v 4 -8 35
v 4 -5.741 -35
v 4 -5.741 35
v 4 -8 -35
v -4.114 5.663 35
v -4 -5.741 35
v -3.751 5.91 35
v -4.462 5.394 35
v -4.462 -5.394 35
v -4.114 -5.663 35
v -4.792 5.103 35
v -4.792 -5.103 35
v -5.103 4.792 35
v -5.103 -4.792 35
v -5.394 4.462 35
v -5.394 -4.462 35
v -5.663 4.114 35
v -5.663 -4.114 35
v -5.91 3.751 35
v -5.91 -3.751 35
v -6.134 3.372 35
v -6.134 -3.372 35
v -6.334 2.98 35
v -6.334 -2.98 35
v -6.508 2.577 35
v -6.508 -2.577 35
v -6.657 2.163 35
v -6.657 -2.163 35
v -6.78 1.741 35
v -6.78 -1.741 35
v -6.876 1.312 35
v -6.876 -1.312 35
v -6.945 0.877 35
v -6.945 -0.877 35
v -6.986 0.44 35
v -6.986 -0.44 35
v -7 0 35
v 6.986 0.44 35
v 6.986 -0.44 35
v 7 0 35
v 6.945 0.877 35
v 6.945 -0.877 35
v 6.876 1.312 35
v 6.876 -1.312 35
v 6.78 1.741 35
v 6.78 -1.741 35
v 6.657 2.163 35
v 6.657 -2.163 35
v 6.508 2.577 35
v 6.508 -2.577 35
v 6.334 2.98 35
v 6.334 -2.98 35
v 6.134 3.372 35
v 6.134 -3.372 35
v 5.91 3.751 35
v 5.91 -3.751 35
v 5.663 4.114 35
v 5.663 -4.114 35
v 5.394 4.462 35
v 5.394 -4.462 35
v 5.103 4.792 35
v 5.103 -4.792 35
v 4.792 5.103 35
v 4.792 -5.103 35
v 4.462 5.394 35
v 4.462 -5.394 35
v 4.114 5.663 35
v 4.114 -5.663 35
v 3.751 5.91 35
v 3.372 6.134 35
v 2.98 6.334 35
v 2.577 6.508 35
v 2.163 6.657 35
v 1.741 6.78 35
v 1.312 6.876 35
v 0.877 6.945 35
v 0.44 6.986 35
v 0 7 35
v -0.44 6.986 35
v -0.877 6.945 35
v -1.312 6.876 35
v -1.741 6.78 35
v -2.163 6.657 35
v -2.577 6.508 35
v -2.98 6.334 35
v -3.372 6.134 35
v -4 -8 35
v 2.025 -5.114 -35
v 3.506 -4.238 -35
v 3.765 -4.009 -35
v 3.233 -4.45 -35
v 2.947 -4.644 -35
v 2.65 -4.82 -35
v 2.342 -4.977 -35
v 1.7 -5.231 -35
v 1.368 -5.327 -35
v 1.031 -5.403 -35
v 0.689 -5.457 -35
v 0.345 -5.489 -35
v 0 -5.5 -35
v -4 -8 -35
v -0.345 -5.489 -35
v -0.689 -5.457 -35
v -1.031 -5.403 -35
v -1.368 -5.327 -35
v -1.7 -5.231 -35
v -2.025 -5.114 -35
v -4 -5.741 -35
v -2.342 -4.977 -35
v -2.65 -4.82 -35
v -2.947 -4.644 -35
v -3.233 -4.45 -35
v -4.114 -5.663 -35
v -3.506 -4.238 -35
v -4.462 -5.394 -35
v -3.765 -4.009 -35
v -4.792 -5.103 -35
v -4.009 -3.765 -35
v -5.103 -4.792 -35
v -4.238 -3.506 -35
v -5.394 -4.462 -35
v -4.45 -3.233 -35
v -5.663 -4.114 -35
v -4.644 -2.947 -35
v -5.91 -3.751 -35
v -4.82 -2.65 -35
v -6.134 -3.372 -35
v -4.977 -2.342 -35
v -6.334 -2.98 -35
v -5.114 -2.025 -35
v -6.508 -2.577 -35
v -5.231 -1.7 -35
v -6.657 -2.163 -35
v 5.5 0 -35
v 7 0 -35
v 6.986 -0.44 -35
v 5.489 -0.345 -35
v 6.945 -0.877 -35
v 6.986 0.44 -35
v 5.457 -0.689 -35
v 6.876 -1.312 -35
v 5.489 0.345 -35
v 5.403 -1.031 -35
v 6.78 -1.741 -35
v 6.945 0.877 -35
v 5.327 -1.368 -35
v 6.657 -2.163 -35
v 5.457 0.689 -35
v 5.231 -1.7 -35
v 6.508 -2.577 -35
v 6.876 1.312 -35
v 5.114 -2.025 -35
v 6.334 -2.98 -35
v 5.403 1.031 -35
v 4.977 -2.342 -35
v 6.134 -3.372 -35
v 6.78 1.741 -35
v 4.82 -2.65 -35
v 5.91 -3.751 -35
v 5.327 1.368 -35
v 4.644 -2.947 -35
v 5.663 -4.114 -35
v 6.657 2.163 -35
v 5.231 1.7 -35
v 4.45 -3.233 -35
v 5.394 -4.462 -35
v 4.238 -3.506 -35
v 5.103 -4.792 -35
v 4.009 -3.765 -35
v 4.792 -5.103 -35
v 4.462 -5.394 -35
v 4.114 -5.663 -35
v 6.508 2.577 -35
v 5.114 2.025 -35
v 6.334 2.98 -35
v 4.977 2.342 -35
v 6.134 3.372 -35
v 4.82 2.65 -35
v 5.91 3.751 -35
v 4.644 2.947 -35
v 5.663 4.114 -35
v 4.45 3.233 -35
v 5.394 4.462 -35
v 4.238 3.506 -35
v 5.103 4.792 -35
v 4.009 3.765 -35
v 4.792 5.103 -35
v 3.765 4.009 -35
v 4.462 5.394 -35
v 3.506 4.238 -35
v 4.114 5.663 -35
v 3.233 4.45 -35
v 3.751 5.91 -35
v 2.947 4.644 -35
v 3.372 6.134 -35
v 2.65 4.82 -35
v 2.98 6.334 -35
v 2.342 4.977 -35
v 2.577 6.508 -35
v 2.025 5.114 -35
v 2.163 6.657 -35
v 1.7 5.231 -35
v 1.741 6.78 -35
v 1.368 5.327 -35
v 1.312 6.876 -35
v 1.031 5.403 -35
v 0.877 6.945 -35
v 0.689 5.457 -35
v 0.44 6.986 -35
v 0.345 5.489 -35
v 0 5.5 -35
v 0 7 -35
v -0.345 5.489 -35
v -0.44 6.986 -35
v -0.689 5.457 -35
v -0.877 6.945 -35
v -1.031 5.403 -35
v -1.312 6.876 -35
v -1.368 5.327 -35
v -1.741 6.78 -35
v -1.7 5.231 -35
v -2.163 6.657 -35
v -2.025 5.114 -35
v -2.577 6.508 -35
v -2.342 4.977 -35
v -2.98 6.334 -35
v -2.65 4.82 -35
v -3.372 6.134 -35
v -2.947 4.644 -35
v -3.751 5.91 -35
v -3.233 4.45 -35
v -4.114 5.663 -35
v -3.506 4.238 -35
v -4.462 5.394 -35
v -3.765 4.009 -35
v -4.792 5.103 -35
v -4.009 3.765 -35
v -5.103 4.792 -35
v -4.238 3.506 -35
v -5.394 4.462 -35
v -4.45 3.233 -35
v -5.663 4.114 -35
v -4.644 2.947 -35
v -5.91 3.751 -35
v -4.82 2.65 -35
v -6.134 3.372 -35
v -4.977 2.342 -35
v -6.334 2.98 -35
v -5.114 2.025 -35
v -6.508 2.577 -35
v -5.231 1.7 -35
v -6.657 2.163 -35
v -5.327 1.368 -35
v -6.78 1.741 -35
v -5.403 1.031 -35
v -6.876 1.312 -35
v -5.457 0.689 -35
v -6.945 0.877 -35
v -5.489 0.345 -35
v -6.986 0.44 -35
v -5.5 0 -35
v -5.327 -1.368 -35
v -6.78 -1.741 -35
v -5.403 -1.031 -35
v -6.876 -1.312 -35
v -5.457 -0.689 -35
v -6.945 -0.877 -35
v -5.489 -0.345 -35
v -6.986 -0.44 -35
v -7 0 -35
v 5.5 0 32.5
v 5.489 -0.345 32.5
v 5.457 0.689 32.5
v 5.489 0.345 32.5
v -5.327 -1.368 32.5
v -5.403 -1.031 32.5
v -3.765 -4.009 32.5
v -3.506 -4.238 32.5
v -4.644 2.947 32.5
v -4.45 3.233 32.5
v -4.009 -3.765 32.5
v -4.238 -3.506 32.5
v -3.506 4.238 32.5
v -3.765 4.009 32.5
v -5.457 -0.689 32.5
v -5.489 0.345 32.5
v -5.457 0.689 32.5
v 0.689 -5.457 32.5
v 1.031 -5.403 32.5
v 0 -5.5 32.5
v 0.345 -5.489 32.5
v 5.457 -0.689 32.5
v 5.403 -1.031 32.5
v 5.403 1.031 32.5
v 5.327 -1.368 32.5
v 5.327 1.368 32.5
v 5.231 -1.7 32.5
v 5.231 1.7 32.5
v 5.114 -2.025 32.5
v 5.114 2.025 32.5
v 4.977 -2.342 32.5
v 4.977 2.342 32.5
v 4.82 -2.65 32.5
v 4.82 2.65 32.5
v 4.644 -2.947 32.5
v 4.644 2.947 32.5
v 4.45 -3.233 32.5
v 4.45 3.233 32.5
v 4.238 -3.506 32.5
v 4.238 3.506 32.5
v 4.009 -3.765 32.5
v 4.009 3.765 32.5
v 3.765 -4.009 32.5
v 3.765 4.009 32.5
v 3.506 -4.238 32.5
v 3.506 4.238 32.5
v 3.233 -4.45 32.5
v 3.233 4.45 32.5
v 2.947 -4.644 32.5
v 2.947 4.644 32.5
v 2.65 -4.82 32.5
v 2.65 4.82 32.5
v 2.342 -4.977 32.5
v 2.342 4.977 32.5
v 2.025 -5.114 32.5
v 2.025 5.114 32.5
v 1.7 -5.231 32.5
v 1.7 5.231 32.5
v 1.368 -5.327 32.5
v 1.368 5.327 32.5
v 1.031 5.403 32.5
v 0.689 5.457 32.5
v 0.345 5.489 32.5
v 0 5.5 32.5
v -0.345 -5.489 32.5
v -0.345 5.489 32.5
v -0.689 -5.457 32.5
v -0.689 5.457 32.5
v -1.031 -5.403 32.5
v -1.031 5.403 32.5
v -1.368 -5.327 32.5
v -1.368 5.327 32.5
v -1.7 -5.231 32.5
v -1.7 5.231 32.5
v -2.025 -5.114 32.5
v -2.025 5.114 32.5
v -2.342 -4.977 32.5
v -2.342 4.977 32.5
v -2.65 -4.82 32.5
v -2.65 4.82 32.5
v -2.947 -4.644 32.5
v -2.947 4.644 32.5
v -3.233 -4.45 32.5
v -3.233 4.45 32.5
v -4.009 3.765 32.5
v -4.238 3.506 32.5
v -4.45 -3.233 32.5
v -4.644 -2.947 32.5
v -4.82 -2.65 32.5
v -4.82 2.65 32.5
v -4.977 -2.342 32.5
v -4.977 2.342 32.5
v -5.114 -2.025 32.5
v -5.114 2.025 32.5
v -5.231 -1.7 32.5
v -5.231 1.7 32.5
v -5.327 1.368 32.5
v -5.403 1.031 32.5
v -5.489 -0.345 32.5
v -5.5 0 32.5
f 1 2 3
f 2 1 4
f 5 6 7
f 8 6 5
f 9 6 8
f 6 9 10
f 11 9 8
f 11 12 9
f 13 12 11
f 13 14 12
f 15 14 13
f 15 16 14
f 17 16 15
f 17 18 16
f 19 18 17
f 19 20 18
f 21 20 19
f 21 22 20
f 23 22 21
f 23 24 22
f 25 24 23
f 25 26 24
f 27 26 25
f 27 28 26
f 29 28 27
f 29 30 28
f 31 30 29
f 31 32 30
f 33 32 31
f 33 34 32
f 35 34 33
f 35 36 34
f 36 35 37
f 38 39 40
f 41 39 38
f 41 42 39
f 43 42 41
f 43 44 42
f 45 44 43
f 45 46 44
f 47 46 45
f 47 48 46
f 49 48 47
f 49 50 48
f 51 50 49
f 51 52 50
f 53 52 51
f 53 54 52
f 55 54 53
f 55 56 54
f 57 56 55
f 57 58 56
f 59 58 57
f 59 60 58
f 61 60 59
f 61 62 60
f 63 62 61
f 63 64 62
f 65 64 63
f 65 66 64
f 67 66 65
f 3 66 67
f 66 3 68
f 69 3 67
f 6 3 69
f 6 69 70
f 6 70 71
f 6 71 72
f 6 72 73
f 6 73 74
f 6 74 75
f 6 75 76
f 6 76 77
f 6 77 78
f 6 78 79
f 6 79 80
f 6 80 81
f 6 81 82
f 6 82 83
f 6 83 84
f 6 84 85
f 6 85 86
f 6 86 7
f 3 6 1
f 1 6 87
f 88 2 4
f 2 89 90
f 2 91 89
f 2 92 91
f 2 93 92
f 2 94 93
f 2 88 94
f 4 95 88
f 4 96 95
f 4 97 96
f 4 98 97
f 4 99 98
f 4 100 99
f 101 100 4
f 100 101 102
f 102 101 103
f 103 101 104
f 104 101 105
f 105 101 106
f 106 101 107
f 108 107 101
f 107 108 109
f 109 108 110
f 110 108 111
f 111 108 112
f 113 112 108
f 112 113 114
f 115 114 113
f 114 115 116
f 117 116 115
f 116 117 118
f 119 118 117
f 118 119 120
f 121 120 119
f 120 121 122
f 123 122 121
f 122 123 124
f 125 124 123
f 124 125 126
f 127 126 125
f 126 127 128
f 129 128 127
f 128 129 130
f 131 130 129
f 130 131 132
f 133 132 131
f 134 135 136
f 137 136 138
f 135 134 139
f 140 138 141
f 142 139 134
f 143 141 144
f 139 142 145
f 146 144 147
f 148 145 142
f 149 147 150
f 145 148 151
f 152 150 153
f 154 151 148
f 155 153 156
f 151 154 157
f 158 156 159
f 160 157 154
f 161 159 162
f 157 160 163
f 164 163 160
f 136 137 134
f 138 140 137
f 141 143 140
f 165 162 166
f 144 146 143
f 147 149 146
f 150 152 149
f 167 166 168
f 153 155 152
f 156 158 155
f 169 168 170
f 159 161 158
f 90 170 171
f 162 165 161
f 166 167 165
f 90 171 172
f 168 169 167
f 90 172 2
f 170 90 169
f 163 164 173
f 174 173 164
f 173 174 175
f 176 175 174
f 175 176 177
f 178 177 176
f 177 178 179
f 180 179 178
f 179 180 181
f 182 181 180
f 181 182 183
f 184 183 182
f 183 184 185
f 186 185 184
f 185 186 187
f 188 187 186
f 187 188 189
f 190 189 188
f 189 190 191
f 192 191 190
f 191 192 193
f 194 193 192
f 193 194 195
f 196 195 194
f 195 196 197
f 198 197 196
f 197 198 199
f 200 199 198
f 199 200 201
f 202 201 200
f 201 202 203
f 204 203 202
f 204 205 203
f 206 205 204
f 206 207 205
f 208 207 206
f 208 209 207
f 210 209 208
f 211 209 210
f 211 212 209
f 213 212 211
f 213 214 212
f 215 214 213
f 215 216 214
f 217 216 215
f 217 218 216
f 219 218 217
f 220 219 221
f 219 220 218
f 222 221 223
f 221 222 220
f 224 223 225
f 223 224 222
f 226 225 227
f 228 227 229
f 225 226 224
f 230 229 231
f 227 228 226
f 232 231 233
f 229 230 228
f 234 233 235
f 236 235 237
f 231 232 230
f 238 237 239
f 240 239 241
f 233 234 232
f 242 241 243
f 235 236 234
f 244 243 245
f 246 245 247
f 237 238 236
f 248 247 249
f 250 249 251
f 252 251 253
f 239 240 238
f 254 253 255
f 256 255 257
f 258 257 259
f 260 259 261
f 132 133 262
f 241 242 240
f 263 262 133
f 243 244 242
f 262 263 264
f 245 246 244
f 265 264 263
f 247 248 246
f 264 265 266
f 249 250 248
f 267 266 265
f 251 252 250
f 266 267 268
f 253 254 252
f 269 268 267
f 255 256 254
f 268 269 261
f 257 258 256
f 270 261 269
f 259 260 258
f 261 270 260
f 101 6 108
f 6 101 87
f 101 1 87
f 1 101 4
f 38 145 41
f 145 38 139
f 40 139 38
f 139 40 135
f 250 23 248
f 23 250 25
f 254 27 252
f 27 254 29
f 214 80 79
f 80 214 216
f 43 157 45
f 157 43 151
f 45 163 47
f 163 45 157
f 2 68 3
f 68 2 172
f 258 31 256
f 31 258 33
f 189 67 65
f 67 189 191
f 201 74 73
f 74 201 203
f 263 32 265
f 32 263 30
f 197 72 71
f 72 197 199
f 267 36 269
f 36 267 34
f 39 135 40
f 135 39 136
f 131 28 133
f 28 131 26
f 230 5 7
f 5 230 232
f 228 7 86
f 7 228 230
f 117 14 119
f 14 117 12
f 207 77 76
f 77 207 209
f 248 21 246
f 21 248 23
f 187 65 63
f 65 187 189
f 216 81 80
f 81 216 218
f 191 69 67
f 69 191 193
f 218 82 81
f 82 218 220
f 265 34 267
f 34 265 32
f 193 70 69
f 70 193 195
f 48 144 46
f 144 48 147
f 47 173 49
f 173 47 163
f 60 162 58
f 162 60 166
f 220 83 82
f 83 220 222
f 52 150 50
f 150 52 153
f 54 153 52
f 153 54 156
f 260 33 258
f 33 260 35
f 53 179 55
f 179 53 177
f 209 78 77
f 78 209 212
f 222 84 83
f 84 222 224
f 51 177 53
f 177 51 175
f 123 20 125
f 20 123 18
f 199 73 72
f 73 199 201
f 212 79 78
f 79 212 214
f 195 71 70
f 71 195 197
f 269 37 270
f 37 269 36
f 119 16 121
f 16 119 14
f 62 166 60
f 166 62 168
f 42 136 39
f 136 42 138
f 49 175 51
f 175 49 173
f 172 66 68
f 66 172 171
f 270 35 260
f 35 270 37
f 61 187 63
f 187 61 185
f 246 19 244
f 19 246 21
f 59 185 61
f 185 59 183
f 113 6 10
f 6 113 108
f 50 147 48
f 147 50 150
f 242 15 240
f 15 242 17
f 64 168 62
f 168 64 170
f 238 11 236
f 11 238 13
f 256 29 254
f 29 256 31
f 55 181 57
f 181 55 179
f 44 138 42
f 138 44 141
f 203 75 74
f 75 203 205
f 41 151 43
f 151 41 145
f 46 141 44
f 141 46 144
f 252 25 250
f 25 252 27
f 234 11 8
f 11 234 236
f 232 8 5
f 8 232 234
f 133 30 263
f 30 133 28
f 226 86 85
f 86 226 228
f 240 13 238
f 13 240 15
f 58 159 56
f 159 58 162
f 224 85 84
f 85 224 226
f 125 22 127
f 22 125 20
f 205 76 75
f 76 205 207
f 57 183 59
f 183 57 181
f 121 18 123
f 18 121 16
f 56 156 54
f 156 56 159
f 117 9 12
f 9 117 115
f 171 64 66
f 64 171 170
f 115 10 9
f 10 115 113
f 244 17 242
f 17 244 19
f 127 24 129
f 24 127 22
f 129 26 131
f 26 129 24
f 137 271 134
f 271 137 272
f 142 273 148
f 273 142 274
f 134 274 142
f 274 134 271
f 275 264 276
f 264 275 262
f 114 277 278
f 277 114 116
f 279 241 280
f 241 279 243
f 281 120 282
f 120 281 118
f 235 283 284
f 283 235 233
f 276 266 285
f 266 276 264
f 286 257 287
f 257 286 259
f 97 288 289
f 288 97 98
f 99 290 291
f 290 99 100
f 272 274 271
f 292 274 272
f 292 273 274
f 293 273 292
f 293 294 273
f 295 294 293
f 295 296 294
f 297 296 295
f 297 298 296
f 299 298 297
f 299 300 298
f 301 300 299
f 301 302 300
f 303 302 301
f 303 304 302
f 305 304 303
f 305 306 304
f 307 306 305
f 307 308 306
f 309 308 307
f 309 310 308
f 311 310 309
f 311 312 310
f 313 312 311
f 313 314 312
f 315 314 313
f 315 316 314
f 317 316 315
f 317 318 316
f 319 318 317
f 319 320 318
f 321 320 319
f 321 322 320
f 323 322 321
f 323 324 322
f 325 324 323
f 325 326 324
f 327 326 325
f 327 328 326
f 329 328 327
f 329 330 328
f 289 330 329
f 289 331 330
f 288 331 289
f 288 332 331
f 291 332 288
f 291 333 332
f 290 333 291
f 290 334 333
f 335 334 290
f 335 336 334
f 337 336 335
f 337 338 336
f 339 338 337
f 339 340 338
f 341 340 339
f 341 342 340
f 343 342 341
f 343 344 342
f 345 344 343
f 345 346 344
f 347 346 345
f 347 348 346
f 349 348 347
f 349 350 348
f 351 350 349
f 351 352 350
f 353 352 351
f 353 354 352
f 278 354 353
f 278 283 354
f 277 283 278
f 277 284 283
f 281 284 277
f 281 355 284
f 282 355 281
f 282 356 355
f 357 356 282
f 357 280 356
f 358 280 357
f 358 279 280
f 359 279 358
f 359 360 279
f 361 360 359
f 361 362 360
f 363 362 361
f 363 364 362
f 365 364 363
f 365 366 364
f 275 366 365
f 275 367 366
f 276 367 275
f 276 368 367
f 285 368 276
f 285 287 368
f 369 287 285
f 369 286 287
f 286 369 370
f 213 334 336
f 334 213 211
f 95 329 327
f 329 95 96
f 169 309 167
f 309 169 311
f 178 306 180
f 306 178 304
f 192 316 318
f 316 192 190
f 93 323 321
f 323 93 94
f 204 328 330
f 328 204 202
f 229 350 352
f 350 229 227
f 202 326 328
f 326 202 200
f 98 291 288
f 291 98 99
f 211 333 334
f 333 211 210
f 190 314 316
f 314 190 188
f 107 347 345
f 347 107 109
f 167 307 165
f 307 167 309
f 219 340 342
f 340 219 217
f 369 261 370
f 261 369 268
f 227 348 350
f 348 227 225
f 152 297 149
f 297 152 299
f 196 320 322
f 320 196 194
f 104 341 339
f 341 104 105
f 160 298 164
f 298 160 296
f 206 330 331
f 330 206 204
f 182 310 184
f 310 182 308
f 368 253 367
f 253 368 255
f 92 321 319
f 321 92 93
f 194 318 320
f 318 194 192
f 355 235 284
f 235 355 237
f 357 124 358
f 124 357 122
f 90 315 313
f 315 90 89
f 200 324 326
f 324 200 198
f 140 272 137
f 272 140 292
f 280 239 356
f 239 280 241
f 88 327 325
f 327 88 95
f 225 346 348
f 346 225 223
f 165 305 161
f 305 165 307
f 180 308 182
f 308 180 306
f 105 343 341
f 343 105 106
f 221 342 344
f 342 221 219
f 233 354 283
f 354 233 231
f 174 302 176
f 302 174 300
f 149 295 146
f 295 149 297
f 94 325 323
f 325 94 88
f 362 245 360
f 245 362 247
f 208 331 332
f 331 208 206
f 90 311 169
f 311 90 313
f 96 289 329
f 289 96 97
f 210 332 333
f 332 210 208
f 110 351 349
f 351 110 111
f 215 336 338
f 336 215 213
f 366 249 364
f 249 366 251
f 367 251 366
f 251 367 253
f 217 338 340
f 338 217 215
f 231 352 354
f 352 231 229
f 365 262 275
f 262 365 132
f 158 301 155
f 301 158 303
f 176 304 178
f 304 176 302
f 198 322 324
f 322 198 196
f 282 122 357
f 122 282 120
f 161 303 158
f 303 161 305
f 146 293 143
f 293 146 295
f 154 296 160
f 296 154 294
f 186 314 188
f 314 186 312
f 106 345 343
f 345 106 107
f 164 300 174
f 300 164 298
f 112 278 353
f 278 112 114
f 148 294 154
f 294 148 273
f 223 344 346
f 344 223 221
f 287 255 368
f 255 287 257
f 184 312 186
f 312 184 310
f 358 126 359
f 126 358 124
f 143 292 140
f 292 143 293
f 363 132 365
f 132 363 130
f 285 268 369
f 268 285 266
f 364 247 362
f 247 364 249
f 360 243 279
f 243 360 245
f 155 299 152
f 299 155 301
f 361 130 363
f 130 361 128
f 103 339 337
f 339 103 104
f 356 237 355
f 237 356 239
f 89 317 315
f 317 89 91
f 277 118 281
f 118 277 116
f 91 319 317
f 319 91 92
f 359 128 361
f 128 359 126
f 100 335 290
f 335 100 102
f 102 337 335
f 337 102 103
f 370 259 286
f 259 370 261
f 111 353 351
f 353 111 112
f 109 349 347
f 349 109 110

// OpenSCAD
$fn = 100;

//rotate(v=[1,0,0], a=90)
intersection()
{
difference()
{
    union(){
        translate([0,-6, 0]) 
        cube([8,4,70],center=true);

        cylinder(r=7, h=70, center=true);

        translate([0,0,-70/2])    
        difference(){
        
        //cylinder(r1=12, r2=2, h=7.5);

        //translate([0,0,-0.5])
        //cylinder(r1=5, r2=1.25, h=5);
        }

    }

    translate([0,0,-2.5])
    cylinder(r=5.5, h=70, center=true);


}

//translate([0,5-2,0])
cube([20,20,100],center=true);

//cube([14,14,100],center=true);
}
